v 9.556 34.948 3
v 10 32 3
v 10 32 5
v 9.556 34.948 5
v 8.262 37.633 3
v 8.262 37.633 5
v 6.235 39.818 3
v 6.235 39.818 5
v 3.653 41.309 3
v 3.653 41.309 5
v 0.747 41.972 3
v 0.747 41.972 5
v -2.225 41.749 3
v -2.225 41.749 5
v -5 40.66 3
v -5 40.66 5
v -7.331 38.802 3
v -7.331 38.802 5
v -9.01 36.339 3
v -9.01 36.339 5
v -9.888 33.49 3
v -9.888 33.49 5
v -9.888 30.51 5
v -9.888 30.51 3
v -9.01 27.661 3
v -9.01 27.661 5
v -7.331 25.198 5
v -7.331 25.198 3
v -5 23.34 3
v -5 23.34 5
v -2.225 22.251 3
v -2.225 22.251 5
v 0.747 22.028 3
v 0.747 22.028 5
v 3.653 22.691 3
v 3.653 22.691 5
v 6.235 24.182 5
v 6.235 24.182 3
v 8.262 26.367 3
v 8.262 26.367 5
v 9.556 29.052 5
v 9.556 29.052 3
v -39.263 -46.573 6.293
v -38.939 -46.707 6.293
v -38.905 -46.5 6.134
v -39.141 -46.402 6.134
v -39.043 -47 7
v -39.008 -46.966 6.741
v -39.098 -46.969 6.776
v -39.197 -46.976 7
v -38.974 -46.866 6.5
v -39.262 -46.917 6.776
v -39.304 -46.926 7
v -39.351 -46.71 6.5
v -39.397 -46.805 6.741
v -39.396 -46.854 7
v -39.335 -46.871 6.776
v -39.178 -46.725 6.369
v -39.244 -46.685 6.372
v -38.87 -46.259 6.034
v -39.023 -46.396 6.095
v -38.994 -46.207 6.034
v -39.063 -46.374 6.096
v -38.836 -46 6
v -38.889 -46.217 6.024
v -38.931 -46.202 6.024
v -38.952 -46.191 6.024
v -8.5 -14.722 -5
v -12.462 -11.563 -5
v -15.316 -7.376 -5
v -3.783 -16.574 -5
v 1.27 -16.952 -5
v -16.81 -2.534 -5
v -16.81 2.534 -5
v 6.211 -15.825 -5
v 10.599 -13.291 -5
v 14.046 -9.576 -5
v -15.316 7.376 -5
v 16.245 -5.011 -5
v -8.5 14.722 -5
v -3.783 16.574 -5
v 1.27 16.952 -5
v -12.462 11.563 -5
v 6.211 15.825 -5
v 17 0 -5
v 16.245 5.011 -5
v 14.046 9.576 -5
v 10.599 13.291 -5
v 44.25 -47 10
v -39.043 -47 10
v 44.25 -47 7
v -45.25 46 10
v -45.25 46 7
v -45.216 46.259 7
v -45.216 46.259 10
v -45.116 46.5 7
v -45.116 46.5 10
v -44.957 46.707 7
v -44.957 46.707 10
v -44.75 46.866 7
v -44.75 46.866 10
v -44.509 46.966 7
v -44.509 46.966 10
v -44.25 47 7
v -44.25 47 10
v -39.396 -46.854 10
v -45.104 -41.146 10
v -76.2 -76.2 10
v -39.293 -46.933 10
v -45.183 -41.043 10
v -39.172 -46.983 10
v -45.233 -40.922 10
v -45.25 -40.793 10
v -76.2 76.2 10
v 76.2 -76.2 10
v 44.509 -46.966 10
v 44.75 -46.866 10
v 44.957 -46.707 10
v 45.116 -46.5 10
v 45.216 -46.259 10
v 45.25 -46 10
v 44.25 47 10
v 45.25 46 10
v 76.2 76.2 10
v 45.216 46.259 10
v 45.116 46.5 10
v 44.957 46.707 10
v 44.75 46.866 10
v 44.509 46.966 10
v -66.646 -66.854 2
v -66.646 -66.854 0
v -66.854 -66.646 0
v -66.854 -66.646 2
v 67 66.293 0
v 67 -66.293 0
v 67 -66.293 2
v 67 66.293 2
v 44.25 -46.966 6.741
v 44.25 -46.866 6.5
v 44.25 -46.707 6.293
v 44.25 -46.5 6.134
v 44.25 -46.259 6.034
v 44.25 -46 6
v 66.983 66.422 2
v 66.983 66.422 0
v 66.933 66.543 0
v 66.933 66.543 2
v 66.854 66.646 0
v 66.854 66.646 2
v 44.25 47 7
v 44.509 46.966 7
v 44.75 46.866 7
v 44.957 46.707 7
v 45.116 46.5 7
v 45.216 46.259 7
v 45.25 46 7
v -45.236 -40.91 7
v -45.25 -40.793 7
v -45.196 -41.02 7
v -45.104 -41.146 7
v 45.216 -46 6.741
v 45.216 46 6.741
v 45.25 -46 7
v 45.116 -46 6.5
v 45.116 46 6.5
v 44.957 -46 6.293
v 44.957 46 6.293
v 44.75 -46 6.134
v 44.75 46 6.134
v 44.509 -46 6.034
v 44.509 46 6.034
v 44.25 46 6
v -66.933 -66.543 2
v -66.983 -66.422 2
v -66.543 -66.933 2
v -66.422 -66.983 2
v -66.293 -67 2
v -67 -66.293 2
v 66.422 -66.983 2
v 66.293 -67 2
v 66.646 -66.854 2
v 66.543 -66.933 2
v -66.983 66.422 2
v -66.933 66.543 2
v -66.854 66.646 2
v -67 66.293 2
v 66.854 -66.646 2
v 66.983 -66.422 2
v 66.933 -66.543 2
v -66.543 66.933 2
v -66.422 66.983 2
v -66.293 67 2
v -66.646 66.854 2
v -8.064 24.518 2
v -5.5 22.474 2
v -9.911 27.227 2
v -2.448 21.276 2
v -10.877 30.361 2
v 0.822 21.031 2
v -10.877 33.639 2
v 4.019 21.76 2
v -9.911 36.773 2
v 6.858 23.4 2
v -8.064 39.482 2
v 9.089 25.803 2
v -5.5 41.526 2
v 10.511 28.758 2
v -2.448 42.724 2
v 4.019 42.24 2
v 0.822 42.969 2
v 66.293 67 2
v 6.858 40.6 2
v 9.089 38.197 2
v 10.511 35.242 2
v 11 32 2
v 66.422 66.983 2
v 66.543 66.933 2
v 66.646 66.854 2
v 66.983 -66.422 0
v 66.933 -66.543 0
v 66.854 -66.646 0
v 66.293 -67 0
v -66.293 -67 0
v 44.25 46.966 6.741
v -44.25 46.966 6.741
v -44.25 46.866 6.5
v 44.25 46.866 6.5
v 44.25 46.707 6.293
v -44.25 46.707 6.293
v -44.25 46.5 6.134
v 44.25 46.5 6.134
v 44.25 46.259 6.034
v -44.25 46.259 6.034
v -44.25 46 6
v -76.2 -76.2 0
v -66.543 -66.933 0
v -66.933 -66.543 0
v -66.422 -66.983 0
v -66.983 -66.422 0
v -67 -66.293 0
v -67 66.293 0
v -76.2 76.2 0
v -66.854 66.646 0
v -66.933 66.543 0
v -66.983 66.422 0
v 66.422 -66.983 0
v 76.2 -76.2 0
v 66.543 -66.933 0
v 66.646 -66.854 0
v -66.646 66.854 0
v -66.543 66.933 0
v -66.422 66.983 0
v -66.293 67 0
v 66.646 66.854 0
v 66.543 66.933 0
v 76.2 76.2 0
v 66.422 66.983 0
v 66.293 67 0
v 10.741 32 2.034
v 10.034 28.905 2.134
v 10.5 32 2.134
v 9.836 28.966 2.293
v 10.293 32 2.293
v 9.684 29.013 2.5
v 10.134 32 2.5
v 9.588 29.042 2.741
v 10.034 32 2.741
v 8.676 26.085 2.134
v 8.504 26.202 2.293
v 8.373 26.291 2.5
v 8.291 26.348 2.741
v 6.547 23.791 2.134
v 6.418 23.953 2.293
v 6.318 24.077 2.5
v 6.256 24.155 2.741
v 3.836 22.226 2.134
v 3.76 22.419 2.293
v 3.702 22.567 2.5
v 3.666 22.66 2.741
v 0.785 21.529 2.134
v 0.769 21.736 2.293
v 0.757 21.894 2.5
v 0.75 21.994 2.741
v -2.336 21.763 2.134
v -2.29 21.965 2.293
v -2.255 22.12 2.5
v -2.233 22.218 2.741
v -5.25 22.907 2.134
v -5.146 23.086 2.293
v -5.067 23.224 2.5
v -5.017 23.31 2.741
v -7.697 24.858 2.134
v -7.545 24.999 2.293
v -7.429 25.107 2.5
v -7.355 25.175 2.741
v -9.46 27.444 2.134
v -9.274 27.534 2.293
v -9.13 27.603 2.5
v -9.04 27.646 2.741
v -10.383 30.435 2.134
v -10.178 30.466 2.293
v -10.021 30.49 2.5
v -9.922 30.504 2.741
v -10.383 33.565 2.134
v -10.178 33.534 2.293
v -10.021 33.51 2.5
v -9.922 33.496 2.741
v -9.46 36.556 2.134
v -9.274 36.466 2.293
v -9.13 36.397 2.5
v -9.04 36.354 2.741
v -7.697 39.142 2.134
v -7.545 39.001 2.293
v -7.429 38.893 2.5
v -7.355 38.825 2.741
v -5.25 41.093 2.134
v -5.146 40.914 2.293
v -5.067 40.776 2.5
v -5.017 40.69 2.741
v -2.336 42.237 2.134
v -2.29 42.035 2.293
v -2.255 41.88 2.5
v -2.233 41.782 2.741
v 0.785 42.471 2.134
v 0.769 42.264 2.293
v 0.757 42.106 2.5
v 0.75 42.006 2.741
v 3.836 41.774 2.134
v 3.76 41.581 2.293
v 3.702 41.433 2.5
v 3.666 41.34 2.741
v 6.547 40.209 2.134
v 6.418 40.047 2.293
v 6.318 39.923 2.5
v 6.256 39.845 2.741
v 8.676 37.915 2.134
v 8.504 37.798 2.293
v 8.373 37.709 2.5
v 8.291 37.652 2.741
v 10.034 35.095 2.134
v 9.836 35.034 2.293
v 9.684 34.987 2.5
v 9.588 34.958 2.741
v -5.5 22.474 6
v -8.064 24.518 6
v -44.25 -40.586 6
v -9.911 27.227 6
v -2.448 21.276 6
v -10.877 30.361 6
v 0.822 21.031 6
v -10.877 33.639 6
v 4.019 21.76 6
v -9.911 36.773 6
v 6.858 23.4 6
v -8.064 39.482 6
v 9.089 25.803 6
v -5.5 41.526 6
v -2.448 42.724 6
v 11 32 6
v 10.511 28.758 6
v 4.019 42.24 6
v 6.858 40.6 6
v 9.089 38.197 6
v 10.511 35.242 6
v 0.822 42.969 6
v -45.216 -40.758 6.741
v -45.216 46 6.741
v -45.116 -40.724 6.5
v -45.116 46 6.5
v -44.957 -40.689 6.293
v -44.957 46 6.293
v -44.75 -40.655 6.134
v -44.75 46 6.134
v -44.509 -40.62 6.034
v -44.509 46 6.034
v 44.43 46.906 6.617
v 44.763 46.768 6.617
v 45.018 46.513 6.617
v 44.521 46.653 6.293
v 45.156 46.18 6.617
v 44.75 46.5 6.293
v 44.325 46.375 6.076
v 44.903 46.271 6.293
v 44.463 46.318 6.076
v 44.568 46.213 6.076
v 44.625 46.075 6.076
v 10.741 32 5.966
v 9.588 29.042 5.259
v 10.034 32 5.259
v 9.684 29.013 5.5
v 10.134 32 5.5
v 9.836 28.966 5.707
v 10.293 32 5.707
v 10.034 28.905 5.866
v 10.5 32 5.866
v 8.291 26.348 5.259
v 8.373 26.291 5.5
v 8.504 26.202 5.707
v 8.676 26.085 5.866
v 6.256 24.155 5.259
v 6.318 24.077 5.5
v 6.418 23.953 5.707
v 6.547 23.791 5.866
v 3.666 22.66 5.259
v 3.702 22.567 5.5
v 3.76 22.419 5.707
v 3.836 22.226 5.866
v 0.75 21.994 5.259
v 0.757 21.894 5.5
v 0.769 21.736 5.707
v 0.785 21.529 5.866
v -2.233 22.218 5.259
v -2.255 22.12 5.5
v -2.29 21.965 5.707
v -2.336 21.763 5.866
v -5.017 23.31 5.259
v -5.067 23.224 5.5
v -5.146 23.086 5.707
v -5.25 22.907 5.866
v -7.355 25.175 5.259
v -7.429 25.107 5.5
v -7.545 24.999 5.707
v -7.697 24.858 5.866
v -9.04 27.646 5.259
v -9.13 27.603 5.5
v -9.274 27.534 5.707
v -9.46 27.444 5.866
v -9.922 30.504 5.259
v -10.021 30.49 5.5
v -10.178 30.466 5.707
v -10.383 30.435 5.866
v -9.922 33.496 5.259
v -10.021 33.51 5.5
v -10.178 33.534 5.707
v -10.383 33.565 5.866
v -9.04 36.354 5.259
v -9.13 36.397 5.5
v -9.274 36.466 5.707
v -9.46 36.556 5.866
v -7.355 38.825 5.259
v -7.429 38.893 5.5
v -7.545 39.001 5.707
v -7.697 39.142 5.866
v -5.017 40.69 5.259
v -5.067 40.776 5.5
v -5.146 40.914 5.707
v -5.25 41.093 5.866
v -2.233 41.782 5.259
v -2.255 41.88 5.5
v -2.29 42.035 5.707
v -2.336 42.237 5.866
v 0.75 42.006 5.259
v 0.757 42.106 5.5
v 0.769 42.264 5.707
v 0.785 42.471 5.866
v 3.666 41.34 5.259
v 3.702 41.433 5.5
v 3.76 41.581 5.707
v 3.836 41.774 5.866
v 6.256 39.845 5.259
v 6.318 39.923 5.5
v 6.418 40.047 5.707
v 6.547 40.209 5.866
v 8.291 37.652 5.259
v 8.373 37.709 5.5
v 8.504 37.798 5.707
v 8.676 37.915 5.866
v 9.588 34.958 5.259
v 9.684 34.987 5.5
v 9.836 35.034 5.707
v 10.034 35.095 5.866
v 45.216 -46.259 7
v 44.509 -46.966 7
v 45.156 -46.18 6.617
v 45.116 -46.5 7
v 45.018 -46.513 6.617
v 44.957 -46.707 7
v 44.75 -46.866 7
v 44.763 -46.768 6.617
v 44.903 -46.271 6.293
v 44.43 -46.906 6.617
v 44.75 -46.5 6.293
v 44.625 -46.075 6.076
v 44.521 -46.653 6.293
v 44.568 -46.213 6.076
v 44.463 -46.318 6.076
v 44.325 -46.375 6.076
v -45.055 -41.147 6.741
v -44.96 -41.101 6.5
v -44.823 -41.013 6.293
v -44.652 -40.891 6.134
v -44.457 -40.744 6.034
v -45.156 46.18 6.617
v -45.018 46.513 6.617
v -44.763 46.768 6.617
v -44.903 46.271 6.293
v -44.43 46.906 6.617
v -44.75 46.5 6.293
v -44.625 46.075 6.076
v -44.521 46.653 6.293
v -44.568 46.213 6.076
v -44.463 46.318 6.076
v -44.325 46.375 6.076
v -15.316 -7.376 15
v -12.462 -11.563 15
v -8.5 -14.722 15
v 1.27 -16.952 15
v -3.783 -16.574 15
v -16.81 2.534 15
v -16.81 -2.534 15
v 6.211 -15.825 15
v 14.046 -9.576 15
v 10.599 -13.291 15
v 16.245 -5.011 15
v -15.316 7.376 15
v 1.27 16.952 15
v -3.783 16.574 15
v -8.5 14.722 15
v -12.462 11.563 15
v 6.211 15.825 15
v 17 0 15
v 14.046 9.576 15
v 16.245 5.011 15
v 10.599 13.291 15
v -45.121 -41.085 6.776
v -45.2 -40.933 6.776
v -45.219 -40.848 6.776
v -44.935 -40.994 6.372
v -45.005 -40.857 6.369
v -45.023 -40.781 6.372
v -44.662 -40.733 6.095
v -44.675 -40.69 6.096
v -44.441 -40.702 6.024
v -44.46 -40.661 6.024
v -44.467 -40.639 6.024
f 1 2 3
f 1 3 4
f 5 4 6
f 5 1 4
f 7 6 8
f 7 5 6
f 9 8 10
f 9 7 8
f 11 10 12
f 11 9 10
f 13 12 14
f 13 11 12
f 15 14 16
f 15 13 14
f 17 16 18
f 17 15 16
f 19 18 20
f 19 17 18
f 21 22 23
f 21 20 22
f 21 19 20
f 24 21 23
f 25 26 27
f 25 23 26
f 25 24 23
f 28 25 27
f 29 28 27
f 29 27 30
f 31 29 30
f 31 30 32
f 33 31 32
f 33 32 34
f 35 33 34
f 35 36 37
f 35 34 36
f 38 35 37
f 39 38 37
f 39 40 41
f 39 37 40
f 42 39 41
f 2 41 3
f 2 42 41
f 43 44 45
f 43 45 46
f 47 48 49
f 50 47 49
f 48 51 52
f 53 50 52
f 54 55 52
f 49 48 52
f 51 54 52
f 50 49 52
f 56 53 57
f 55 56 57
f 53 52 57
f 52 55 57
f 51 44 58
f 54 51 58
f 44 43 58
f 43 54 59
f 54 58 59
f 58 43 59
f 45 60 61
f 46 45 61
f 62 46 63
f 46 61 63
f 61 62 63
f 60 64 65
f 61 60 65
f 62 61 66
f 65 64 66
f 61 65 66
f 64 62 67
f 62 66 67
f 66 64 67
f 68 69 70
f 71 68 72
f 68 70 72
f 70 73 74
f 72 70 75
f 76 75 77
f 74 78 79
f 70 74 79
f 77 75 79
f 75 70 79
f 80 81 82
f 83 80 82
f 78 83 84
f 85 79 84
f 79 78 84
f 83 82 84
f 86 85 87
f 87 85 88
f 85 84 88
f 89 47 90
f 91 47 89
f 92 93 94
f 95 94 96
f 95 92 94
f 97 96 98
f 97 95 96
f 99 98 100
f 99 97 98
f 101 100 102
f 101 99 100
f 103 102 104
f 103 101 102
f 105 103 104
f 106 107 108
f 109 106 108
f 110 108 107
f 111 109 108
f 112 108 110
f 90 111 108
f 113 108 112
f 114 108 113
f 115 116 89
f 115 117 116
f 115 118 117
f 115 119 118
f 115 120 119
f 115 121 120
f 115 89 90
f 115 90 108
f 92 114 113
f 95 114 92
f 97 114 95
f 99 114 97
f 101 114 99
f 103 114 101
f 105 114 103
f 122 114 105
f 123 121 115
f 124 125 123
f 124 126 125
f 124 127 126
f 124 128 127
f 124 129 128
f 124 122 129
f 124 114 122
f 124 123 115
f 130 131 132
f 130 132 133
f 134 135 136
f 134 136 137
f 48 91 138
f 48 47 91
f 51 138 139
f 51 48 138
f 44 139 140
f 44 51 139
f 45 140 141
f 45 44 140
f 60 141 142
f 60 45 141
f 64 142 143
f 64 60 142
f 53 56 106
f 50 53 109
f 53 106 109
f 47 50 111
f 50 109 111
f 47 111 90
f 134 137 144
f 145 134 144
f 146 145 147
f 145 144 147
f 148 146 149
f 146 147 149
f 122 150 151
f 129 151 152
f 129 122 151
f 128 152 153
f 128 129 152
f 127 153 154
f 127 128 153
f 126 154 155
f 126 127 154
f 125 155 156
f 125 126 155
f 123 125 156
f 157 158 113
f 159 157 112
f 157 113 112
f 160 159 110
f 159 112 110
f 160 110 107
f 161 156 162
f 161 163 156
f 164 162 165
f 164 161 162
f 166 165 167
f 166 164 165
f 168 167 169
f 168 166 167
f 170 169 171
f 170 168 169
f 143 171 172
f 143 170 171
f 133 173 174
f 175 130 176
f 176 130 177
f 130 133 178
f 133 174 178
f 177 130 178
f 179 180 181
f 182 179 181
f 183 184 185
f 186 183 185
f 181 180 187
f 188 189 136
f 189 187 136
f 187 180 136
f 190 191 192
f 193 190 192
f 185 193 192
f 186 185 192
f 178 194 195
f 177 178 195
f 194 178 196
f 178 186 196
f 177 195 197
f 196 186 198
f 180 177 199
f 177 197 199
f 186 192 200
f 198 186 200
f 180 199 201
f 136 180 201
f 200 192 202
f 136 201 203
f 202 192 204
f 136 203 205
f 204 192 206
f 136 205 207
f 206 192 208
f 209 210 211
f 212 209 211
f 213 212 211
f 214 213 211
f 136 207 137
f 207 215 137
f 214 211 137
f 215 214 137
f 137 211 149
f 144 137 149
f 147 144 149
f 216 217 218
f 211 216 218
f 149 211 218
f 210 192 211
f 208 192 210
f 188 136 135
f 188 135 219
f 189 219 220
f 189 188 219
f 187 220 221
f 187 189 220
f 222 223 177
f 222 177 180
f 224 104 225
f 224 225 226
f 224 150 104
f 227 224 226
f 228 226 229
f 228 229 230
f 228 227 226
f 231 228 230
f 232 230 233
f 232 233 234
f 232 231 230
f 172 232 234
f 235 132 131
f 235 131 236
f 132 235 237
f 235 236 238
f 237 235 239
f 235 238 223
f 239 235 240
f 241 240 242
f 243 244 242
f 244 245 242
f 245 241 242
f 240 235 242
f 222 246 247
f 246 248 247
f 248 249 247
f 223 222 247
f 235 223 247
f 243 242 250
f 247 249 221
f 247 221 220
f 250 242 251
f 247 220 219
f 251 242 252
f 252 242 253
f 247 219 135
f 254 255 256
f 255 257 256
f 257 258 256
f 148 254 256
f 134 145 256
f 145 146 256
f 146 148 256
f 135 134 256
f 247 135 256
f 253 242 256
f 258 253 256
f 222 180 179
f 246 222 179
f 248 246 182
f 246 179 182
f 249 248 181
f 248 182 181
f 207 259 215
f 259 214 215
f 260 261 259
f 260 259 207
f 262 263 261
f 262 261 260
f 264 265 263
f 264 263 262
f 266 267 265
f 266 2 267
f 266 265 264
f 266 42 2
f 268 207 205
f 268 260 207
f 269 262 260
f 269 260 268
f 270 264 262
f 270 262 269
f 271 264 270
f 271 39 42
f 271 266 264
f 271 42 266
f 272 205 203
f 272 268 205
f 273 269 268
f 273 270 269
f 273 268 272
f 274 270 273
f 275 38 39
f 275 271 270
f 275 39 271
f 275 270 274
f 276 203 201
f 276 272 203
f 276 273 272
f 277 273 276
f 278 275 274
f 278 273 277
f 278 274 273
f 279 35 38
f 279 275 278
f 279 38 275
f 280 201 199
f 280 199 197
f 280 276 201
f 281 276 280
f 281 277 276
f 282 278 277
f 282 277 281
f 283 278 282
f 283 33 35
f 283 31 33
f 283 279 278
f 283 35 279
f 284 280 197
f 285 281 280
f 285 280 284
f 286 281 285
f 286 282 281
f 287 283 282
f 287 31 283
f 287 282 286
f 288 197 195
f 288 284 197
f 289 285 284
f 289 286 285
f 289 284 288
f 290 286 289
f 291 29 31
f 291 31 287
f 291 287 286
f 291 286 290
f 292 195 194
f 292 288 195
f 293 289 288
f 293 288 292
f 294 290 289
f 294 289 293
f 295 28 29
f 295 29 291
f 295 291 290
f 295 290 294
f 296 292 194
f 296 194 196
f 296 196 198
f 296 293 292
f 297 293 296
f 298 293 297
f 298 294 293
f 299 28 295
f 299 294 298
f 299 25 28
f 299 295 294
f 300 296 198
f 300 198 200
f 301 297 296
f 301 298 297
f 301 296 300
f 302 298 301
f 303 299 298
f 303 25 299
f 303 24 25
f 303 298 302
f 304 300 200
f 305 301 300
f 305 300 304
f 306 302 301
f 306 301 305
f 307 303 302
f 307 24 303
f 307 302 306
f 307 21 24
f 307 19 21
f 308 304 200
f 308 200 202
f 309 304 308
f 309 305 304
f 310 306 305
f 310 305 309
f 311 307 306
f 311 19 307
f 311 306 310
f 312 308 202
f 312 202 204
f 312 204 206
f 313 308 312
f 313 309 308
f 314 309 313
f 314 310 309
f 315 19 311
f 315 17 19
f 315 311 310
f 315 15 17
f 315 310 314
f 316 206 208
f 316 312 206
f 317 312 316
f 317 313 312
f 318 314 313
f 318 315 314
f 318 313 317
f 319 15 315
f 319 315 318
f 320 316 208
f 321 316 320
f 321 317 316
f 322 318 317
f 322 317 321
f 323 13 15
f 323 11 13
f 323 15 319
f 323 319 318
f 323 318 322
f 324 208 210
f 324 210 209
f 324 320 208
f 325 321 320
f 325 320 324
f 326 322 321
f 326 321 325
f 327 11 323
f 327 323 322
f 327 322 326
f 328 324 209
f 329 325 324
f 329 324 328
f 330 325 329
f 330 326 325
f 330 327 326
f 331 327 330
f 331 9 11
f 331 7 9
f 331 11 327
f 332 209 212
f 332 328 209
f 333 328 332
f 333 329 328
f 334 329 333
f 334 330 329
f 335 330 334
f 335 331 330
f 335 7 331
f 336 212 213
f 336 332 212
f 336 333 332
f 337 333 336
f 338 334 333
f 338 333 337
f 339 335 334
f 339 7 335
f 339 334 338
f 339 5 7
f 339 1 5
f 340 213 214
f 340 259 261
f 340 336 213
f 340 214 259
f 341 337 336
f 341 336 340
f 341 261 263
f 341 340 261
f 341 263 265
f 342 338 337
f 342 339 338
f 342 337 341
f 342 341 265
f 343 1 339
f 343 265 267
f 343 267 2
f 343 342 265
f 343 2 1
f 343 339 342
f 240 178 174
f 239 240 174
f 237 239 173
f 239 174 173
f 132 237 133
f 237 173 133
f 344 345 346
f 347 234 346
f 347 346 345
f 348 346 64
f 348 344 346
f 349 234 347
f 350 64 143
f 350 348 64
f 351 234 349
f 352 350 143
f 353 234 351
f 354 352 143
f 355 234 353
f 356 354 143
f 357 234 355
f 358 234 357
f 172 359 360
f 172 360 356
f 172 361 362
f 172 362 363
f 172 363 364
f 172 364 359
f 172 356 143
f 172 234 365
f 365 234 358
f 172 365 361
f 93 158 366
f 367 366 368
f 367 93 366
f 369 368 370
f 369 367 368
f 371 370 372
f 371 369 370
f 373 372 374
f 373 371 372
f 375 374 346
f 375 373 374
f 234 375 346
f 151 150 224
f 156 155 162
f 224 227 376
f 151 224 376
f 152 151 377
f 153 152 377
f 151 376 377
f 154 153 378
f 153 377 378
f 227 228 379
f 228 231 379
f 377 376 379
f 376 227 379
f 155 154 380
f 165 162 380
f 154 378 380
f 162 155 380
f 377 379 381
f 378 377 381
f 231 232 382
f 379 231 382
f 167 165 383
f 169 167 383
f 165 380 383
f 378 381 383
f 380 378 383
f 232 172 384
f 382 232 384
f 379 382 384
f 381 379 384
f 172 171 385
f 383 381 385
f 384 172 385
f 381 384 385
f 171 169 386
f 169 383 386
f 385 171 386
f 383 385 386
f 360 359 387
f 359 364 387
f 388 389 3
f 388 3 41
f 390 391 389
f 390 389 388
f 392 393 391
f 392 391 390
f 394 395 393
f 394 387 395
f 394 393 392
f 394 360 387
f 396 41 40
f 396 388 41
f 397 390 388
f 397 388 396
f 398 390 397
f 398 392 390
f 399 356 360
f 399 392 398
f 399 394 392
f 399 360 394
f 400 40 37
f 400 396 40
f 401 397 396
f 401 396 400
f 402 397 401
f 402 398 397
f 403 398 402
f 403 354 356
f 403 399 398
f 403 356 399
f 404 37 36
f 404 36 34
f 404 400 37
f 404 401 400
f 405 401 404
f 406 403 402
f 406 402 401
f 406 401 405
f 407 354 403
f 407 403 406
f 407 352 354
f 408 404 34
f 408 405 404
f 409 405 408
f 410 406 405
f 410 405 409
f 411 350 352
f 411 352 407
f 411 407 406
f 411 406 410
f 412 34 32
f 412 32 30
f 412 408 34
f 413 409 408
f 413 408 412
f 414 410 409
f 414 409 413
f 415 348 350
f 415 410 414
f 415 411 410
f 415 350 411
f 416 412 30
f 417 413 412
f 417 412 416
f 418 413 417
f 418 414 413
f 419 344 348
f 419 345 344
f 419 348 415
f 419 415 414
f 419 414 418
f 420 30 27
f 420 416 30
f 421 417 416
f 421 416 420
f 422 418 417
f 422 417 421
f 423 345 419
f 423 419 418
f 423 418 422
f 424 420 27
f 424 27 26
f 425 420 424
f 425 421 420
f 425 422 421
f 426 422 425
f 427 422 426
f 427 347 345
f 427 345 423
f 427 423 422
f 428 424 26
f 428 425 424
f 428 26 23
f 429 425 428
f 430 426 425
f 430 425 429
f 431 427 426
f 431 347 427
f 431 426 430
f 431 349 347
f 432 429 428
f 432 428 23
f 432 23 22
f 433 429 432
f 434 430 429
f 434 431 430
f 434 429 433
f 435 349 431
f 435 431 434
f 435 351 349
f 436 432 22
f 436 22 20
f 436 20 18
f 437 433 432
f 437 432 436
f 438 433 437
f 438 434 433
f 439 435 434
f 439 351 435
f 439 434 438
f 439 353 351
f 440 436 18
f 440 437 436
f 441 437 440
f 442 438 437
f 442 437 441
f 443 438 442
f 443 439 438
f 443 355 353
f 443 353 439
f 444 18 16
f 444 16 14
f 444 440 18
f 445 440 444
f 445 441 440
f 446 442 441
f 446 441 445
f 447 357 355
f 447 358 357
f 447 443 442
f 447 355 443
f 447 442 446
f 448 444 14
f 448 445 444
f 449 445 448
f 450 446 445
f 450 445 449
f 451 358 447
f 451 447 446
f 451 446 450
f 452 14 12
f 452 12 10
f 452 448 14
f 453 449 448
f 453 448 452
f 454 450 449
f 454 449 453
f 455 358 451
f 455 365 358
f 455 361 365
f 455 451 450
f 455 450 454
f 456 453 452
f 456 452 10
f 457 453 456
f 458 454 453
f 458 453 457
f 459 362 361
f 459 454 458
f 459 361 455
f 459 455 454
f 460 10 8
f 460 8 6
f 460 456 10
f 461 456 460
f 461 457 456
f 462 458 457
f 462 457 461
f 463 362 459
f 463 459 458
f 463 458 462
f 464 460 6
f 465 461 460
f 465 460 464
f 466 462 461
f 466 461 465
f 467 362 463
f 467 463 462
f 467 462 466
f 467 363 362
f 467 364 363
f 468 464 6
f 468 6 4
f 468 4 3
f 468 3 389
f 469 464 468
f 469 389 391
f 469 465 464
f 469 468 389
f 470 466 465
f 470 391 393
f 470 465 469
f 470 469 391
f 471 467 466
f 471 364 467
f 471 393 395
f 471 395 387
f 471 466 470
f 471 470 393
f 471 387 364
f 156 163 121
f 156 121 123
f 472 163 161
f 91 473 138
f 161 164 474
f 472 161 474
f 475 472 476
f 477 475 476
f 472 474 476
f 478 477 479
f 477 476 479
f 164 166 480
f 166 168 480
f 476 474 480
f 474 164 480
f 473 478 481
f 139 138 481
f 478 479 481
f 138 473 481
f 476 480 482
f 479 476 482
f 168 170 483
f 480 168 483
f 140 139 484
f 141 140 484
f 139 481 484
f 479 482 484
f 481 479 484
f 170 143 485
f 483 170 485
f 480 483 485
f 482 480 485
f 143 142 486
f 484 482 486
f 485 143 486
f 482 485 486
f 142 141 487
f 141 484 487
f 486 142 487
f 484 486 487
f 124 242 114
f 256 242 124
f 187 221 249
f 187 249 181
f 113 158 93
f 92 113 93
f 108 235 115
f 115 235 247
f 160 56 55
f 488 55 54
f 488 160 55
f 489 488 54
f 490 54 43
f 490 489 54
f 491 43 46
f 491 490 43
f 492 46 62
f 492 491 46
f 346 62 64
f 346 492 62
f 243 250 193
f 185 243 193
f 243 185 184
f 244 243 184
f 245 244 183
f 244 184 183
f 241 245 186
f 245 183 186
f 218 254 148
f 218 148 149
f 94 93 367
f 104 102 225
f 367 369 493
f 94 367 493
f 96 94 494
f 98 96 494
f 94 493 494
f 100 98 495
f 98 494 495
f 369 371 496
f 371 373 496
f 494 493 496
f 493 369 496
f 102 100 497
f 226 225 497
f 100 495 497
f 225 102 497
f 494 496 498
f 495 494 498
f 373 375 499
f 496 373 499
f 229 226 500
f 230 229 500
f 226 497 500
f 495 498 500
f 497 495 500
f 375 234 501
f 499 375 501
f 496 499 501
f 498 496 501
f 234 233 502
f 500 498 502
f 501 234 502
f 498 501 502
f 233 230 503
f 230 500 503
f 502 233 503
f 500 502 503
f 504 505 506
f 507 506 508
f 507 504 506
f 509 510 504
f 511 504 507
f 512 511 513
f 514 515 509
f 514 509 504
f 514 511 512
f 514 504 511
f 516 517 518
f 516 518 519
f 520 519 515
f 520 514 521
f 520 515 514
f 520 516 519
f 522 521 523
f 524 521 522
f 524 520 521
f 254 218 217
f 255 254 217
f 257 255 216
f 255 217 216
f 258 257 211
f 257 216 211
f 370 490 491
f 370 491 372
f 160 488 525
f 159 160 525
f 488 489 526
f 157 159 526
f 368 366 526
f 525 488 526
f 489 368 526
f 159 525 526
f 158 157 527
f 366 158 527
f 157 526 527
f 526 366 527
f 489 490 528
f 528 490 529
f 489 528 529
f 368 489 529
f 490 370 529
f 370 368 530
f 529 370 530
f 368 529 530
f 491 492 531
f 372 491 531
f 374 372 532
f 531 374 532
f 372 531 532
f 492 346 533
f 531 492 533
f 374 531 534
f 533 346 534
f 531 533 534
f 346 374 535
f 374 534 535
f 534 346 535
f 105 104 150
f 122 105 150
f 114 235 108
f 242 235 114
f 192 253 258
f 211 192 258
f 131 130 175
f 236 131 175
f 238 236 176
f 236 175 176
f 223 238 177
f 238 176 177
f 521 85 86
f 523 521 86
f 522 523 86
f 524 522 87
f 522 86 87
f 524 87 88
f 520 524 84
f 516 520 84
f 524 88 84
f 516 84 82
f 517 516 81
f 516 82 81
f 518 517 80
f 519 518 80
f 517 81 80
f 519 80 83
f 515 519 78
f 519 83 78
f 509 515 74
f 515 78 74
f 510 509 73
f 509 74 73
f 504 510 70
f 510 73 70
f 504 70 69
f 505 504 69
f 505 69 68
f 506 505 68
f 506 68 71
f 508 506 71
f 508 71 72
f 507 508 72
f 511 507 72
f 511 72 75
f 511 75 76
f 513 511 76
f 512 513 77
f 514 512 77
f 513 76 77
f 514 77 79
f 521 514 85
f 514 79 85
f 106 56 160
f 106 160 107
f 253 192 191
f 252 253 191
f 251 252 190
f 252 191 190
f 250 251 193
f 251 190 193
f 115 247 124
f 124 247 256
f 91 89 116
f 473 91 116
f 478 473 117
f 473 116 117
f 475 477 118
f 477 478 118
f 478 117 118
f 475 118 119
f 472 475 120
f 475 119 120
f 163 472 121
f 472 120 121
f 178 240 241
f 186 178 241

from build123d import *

# Parameters (mm, degrees)
BOX001_W          = 90.5
BOX001_H          = 94
BOX001_DEPTH      = 8
CHAMFER_SIZE      = 6
FILLET_R          = 1
FILLET001_R       = 0.5
FILLET002_R       = 1
BOX002_W          = 134
BOX002_H          = 134
BOX002_DEPTH      = 4
CHAMFER001_SIZE   = 0.5
FILLET003_R       = 0.5
FILLET004_R       = 0.5
FILLET005_R       = 0.5
FILLET006_R       = 0.5
CYLINDER_R        = 10
CYLINDER_DEPTH    = 20
BOX_W             = 152.4
BOX_H             = 152.4
BOX_DEPTH         = 10
FILLET007_R       = 1
CYLINDER001_R     = 17
CYLINDER001_DEPTH = 20


with BuildPart() as body:
    # Box001 → Box001 (join)
    with BuildSketch(Plane(origin=(-45.25, -47, 6), x_dir=(1, 0, 0), z_dir=(0, 0, 1))):
        with Locations((45.25, 47)):
            Rectangle(BOX001_W, BOX001_H)
    extrude(amount=BOX001_DEPTH)

    # Chamfer
    chamfer_edges = [body.edges().sort_by_distance(p)[0] for p in [
        (-45.25, -47, 10),
    ]]
    chamfer(chamfer_edges, length=CHAMFER_SIZE)

    # Fillet
    fillet_edges = [body.edges().sort_by_distance(p)[0] for p in [
        (45.25, 47, 10),
        (-45.25, 47, 10),
        (45.25, -47, 10),
    ]]
    fillet(fillet_edges, radius=FILLET_R)

    # Fillet001
    fillet001_edges = [body.edges().sort_by_distance(p)[0] for p in [
        (-45.25, -41, 10),
        (-39.25, -47, 10),
    ]]
    fillet(fillet001_edges, radius=FILLET001_R)

    # Fillet002
    fillet002_edges = [body.edges().sort_by_distance(p)[0] for p in [
        (-45.25, 2.603553, 6),
        (-45.21194, -40.984235, 6),
        (-42.25, -44, 6),
        (2.603553, -47, 6),
        (-39.234235, -46.96194, 6),
        (44.957107, -46.707107, 6),
        (45.25, 0, 6),
        (44.957107, 46.707107, 6),
        (0, 47, 6),
        (-44.957107, 46.707107, 6),
    ]]
    fillet(fillet002_edges, radius=FILLET002_R)


with BuildPart() as body002:
    # Box002 → Box002 (join)
    with BuildSketch(Plane(origin=(-67, -67, -2), x_dir=(1, 0, 0), z_dir=(0, 0, 1))):
        with Locations((67, 67)):
            Rectangle(BOX002_W, BOX002_H)
    extrude(amount=BOX002_DEPTH)

    # Chamfer001
    chamfer001_edges = [body002.edges().sort_by_distance(p)[0] for p in [
        (-67, -67, 0),
        (-67, 67, 0),
        (67, 67, 0),
        (67, -67, 0),
    ]]
    chamfer(chamfer001_edges, length=CHAMFER001_SIZE)

    # Fillet003
    fillet003_edges = [body002.edges().sort_by_distance(p)[0] for p in [
        (-66.5, -67, 0),
        (-67, -66.5, 0),
    ]]
    fillet(fillet003_edges, radius=FILLET003_R)

    # Fillet004
    fillet004_edges = [body002.edges().sort_by_distance(p)[0] for p in [
        (67, -66.5, 0),
        (66.5, -67, 0),
    ]]
    fillet(fillet004_edges, radius=FILLET004_R)

    # Fillet005
    fillet005_edges = [body002.edges().sort_by_distance(p)[0] for p in [
        (67, 66.5, 0),
        (66.5, 67, 0),
    ]]
    fillet(fillet005_edges, radius=FILLET005_R)

    # Fillet006
    fillet006_edges = [body002.edges().sort_by_distance(p)[0] for p in [
        (-67, 66.5, 0),
        (-66.5, 67, 0),
    ]]
    fillet(fillet006_edges, radius=FILLET006_R)


with BuildPart() as body004:
    # Cylinder → Cylinder (join)
    with BuildSketch(Plane(origin=(0, 32, -5), x_dir=(1, 0, 0), z_dir=(0, 0, 1))):
        Circle(CYLINDER_R)
    extrude(amount=CYLINDER_DEPTH)


with BuildPart() as base:
    # Box → Box (join)
    with BuildSketch(Plane(origin=(-76.2, -76.2, 0), x_dir=(1, 0, 0), z_dir=(0, 0, 1))):
        with Locations((76.2, 76.2)):
            Rectangle(BOX_W, BOX_H)
    extrude(amount=BOX_DEPTH)

    # Boolean: cut Body
    add(body.part, mode=Mode.SUBTRACT)

    # Boolean001: cut Body002, Body004
    add(body002.part, mode=Mode.SUBTRACT)
    add(body004.part, mode=Mode.SUBTRACT)

    # Fillet007
    fillet007_edges = [base.edges().sort_by_distance(p)[0] for p in [
        (-10, 32, 2),
        (10, 32, 4),
        (-10, 32, 6),
    ]]
    fillet(fillet007_edges, radius=FILLET007_R)


with BuildPart() as body005:
    # Cylinder001 → Cylinder001 (join)
    with BuildSketch(Plane.XY.offset(-5)):
        Circle(CYLINDER001_R)
    extrude(amount=CYLINDER001_DEPTH)


solid = Compound([base.part, body005.part])
